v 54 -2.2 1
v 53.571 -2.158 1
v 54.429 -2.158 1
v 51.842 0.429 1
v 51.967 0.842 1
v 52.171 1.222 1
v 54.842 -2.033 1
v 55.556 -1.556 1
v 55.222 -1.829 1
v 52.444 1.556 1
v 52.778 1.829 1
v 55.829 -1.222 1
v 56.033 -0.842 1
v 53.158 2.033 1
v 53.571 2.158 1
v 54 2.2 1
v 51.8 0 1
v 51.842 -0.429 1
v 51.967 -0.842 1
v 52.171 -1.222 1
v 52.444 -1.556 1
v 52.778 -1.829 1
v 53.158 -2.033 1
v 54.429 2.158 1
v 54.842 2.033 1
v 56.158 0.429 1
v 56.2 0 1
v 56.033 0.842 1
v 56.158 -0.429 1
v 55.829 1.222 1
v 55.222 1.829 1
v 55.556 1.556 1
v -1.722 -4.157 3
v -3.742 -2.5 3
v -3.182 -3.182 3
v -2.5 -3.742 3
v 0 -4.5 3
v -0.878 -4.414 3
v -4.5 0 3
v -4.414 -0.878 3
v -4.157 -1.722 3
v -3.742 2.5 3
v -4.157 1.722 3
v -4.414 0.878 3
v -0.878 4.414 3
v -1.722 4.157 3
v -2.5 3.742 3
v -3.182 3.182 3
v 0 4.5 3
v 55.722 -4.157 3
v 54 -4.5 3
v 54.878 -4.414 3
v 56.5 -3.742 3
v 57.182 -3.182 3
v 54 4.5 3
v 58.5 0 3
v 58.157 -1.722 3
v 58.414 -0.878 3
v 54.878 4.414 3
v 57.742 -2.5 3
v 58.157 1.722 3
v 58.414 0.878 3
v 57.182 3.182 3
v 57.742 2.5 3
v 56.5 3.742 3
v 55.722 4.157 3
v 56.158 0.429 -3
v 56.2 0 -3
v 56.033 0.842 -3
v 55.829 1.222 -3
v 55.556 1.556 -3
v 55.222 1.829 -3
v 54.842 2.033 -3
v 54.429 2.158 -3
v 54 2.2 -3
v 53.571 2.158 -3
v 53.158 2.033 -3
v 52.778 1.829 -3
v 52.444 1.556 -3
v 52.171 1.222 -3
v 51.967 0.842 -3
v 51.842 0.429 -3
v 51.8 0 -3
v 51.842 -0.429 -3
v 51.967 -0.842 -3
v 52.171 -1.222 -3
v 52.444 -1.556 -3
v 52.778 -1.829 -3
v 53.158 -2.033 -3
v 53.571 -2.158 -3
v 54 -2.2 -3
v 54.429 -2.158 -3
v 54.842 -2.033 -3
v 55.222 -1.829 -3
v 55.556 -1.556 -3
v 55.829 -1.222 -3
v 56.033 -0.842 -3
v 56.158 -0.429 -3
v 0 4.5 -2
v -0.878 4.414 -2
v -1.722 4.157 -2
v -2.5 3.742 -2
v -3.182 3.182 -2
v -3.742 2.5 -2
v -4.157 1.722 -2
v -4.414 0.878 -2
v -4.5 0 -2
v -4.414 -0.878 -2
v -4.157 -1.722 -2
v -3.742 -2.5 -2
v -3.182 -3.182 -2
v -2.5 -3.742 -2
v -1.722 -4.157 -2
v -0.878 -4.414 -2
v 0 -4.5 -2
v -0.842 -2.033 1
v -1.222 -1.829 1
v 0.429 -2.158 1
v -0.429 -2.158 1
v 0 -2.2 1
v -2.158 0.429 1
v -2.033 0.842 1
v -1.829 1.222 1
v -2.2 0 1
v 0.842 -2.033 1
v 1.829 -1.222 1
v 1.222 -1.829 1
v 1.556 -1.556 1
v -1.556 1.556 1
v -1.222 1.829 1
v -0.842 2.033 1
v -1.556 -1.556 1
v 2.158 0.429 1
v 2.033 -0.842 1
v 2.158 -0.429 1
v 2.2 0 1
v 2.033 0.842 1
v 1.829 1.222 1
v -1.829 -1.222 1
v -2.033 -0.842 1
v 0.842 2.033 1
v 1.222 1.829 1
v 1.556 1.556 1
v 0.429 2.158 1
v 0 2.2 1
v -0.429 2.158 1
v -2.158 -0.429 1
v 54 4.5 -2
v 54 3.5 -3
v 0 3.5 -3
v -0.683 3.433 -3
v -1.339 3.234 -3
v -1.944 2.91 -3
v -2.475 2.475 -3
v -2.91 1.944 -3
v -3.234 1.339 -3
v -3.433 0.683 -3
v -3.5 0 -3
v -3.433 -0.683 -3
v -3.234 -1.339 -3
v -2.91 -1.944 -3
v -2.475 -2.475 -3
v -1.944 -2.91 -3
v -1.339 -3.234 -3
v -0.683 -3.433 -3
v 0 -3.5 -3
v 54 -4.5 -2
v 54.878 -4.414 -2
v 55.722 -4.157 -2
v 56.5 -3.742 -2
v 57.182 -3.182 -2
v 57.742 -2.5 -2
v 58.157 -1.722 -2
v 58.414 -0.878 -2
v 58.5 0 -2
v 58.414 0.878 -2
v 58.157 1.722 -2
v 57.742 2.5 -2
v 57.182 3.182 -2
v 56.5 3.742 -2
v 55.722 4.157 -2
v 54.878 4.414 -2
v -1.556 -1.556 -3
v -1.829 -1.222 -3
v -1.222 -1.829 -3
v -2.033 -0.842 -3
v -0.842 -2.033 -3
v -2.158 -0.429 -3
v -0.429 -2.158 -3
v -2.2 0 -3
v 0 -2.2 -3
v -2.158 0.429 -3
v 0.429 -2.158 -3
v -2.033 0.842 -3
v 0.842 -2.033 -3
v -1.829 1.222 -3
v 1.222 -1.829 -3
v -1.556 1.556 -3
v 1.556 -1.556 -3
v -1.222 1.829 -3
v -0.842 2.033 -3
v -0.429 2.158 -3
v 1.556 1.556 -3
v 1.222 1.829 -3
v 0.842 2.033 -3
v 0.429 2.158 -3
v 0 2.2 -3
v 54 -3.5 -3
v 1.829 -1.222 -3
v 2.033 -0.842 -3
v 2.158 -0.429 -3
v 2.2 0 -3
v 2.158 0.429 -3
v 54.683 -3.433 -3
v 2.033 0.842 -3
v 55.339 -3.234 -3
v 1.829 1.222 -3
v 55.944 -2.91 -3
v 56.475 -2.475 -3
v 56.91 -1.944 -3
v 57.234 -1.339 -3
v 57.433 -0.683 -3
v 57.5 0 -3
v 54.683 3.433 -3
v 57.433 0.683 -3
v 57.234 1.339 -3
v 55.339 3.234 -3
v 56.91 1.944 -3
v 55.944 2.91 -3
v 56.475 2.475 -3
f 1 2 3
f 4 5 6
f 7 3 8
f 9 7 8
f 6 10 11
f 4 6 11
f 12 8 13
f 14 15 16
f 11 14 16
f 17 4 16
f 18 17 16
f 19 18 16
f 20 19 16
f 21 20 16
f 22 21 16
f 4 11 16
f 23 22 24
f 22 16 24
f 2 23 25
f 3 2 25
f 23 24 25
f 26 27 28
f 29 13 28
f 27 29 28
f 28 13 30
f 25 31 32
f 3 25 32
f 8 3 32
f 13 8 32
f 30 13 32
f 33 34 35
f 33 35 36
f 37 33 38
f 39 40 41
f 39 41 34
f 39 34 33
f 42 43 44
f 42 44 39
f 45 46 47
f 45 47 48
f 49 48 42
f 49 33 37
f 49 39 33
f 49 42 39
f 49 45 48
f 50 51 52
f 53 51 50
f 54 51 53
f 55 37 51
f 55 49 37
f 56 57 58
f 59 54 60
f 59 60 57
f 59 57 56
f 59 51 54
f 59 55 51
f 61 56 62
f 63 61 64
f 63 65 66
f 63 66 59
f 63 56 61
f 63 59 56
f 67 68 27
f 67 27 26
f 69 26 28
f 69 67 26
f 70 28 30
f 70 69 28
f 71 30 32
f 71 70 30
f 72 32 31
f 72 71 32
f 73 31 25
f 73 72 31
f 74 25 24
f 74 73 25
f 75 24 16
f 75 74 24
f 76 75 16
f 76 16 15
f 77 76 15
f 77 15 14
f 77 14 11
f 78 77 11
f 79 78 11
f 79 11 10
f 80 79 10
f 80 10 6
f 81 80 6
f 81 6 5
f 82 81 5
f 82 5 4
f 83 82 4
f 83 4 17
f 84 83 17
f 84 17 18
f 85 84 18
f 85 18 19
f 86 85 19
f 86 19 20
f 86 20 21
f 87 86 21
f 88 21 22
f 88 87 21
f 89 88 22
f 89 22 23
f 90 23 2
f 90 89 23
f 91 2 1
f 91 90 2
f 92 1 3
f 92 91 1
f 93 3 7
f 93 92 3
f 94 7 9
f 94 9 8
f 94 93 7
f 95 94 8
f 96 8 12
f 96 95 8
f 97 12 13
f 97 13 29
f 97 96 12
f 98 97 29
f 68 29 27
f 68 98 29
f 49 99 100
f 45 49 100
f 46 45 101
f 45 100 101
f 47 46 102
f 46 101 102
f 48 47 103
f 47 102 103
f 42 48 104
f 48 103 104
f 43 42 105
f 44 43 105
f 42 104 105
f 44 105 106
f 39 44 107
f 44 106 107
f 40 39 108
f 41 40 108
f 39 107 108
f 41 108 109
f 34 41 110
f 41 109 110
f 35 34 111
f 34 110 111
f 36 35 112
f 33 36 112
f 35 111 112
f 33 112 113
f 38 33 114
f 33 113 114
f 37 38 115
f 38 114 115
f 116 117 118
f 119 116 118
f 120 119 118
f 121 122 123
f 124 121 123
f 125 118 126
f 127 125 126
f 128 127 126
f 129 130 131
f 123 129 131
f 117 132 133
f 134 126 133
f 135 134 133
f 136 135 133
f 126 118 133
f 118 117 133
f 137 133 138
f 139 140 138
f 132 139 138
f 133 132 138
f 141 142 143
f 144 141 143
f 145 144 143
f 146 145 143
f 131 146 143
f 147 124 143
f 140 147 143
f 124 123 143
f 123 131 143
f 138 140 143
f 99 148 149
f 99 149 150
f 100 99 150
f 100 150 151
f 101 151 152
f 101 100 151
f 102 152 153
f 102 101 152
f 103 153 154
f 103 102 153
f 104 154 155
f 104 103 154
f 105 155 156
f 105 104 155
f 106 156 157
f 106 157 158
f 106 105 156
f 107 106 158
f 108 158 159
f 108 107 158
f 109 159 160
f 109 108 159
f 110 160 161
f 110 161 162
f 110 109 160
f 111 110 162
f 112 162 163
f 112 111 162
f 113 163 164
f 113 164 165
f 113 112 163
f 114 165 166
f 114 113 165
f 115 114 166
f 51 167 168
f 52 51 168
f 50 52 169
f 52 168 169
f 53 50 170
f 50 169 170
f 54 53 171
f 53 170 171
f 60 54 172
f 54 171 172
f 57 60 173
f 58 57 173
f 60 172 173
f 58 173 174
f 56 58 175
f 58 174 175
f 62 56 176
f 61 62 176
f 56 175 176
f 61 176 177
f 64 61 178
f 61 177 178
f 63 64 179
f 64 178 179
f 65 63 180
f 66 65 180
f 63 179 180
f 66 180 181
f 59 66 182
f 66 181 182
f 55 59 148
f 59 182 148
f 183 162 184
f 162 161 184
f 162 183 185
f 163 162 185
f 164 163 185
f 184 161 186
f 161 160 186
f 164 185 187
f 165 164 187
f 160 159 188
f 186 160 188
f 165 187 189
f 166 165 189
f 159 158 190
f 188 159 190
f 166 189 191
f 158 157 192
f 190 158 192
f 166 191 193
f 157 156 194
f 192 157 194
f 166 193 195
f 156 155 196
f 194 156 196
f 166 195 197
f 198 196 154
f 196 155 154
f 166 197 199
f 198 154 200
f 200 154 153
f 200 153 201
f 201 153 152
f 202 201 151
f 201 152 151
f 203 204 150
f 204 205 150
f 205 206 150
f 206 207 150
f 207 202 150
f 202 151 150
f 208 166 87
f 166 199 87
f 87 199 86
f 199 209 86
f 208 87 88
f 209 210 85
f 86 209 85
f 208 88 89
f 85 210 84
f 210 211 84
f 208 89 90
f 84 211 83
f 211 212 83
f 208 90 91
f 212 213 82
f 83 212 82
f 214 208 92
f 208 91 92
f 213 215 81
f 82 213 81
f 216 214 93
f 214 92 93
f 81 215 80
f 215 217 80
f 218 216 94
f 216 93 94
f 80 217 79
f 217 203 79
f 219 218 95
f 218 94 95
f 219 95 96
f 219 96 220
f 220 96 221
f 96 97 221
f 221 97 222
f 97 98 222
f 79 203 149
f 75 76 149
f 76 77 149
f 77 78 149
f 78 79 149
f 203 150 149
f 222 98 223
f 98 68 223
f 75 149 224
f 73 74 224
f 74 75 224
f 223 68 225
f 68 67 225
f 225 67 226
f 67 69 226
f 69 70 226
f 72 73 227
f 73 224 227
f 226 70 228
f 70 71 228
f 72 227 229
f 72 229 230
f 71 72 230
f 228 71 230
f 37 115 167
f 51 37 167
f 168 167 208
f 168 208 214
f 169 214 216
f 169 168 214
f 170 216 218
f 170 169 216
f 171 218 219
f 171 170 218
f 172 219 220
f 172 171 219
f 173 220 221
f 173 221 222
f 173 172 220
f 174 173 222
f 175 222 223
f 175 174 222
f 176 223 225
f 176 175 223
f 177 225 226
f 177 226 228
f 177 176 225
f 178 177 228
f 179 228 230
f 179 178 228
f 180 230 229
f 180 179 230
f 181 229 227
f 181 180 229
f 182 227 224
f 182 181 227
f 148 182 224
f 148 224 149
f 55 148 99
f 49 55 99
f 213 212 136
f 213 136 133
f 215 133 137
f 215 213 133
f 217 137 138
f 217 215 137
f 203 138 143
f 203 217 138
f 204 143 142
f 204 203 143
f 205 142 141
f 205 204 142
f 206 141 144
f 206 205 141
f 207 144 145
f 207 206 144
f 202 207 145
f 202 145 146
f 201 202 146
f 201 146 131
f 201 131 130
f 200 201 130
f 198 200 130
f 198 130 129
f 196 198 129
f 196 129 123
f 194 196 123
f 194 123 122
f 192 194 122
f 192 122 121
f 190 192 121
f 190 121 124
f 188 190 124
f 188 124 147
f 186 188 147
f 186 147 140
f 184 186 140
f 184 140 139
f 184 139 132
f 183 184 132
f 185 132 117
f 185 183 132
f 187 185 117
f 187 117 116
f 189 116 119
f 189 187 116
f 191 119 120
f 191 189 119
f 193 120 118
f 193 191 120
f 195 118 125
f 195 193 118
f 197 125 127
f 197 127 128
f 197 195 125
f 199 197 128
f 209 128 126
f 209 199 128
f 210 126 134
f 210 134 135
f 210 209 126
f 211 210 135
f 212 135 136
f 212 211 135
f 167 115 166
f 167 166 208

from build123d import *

# Parameters (mm, degrees)
BOSS_EXTRUDE1_DEPTH      = 3
BOSS_EXTRUDE1_DEPTH_BACK = 3
SKETCH1_R                = 2.2
BOSS_EXTRUDE2_START      = -2
SKETCH2_R                = 2.2
BOSS_EXTRUDE2_DEPTH      = 2
CHAMFER2_SIZE            = 1


with BuildPart() as part:
    # Sketch1 → Boss-Extrude1 (new, two sides: drawn at the far end of the back side and taken through both)
    with BuildSketch(Plane.XY.offset(-BOSS_EXTRUDE1_DEPTH_BACK)):
        with BuildLine():
            ThreePointArc((0, 4.5), (-4.5, 0), (0, -4.5))
            Line((0, -4.5), (54, -4.5))
            ThreePointArc((54, -4.5), (58.5, 0), (54, 4.5))
            Line((54, 4.5), (0, 4.5))
        make_face()
        Circle(SKETCH1_R, mode=Mode.SUBTRACT)
        with Locations((54, 0)):
            Circle(SKETCH1_R, mode=Mode.SUBTRACT)
    extrude(amount=BOSS_EXTRUDE1_DEPTH + BOSS_EXTRUDE1_DEPTH_BACK)

    # Sketch2 → Boss-Extrude2 (add)
    with BuildSketch(Plane.XY.offset(3).offset(BOSS_EXTRUDE2_START)):
        with Locations((54, 0)):
            Circle(SKETCH2_R)
        Circle(SKETCH2_R)
    extrude(amount=BOSS_EXTRUDE2_DEPTH)

    # Chamfer2
    chamfer2_edges = [part.edges().sort_by_distance(p)[0] for p in [
        (58.5, 0, -3),
        (27, 4.5, -3),
        (-4.5, 0, -3),
        (27, -4.5, -3),
    ]]
    chamfer(chamfer2_edges, length=CHAMFER2_SIZE)


solid = part.part
